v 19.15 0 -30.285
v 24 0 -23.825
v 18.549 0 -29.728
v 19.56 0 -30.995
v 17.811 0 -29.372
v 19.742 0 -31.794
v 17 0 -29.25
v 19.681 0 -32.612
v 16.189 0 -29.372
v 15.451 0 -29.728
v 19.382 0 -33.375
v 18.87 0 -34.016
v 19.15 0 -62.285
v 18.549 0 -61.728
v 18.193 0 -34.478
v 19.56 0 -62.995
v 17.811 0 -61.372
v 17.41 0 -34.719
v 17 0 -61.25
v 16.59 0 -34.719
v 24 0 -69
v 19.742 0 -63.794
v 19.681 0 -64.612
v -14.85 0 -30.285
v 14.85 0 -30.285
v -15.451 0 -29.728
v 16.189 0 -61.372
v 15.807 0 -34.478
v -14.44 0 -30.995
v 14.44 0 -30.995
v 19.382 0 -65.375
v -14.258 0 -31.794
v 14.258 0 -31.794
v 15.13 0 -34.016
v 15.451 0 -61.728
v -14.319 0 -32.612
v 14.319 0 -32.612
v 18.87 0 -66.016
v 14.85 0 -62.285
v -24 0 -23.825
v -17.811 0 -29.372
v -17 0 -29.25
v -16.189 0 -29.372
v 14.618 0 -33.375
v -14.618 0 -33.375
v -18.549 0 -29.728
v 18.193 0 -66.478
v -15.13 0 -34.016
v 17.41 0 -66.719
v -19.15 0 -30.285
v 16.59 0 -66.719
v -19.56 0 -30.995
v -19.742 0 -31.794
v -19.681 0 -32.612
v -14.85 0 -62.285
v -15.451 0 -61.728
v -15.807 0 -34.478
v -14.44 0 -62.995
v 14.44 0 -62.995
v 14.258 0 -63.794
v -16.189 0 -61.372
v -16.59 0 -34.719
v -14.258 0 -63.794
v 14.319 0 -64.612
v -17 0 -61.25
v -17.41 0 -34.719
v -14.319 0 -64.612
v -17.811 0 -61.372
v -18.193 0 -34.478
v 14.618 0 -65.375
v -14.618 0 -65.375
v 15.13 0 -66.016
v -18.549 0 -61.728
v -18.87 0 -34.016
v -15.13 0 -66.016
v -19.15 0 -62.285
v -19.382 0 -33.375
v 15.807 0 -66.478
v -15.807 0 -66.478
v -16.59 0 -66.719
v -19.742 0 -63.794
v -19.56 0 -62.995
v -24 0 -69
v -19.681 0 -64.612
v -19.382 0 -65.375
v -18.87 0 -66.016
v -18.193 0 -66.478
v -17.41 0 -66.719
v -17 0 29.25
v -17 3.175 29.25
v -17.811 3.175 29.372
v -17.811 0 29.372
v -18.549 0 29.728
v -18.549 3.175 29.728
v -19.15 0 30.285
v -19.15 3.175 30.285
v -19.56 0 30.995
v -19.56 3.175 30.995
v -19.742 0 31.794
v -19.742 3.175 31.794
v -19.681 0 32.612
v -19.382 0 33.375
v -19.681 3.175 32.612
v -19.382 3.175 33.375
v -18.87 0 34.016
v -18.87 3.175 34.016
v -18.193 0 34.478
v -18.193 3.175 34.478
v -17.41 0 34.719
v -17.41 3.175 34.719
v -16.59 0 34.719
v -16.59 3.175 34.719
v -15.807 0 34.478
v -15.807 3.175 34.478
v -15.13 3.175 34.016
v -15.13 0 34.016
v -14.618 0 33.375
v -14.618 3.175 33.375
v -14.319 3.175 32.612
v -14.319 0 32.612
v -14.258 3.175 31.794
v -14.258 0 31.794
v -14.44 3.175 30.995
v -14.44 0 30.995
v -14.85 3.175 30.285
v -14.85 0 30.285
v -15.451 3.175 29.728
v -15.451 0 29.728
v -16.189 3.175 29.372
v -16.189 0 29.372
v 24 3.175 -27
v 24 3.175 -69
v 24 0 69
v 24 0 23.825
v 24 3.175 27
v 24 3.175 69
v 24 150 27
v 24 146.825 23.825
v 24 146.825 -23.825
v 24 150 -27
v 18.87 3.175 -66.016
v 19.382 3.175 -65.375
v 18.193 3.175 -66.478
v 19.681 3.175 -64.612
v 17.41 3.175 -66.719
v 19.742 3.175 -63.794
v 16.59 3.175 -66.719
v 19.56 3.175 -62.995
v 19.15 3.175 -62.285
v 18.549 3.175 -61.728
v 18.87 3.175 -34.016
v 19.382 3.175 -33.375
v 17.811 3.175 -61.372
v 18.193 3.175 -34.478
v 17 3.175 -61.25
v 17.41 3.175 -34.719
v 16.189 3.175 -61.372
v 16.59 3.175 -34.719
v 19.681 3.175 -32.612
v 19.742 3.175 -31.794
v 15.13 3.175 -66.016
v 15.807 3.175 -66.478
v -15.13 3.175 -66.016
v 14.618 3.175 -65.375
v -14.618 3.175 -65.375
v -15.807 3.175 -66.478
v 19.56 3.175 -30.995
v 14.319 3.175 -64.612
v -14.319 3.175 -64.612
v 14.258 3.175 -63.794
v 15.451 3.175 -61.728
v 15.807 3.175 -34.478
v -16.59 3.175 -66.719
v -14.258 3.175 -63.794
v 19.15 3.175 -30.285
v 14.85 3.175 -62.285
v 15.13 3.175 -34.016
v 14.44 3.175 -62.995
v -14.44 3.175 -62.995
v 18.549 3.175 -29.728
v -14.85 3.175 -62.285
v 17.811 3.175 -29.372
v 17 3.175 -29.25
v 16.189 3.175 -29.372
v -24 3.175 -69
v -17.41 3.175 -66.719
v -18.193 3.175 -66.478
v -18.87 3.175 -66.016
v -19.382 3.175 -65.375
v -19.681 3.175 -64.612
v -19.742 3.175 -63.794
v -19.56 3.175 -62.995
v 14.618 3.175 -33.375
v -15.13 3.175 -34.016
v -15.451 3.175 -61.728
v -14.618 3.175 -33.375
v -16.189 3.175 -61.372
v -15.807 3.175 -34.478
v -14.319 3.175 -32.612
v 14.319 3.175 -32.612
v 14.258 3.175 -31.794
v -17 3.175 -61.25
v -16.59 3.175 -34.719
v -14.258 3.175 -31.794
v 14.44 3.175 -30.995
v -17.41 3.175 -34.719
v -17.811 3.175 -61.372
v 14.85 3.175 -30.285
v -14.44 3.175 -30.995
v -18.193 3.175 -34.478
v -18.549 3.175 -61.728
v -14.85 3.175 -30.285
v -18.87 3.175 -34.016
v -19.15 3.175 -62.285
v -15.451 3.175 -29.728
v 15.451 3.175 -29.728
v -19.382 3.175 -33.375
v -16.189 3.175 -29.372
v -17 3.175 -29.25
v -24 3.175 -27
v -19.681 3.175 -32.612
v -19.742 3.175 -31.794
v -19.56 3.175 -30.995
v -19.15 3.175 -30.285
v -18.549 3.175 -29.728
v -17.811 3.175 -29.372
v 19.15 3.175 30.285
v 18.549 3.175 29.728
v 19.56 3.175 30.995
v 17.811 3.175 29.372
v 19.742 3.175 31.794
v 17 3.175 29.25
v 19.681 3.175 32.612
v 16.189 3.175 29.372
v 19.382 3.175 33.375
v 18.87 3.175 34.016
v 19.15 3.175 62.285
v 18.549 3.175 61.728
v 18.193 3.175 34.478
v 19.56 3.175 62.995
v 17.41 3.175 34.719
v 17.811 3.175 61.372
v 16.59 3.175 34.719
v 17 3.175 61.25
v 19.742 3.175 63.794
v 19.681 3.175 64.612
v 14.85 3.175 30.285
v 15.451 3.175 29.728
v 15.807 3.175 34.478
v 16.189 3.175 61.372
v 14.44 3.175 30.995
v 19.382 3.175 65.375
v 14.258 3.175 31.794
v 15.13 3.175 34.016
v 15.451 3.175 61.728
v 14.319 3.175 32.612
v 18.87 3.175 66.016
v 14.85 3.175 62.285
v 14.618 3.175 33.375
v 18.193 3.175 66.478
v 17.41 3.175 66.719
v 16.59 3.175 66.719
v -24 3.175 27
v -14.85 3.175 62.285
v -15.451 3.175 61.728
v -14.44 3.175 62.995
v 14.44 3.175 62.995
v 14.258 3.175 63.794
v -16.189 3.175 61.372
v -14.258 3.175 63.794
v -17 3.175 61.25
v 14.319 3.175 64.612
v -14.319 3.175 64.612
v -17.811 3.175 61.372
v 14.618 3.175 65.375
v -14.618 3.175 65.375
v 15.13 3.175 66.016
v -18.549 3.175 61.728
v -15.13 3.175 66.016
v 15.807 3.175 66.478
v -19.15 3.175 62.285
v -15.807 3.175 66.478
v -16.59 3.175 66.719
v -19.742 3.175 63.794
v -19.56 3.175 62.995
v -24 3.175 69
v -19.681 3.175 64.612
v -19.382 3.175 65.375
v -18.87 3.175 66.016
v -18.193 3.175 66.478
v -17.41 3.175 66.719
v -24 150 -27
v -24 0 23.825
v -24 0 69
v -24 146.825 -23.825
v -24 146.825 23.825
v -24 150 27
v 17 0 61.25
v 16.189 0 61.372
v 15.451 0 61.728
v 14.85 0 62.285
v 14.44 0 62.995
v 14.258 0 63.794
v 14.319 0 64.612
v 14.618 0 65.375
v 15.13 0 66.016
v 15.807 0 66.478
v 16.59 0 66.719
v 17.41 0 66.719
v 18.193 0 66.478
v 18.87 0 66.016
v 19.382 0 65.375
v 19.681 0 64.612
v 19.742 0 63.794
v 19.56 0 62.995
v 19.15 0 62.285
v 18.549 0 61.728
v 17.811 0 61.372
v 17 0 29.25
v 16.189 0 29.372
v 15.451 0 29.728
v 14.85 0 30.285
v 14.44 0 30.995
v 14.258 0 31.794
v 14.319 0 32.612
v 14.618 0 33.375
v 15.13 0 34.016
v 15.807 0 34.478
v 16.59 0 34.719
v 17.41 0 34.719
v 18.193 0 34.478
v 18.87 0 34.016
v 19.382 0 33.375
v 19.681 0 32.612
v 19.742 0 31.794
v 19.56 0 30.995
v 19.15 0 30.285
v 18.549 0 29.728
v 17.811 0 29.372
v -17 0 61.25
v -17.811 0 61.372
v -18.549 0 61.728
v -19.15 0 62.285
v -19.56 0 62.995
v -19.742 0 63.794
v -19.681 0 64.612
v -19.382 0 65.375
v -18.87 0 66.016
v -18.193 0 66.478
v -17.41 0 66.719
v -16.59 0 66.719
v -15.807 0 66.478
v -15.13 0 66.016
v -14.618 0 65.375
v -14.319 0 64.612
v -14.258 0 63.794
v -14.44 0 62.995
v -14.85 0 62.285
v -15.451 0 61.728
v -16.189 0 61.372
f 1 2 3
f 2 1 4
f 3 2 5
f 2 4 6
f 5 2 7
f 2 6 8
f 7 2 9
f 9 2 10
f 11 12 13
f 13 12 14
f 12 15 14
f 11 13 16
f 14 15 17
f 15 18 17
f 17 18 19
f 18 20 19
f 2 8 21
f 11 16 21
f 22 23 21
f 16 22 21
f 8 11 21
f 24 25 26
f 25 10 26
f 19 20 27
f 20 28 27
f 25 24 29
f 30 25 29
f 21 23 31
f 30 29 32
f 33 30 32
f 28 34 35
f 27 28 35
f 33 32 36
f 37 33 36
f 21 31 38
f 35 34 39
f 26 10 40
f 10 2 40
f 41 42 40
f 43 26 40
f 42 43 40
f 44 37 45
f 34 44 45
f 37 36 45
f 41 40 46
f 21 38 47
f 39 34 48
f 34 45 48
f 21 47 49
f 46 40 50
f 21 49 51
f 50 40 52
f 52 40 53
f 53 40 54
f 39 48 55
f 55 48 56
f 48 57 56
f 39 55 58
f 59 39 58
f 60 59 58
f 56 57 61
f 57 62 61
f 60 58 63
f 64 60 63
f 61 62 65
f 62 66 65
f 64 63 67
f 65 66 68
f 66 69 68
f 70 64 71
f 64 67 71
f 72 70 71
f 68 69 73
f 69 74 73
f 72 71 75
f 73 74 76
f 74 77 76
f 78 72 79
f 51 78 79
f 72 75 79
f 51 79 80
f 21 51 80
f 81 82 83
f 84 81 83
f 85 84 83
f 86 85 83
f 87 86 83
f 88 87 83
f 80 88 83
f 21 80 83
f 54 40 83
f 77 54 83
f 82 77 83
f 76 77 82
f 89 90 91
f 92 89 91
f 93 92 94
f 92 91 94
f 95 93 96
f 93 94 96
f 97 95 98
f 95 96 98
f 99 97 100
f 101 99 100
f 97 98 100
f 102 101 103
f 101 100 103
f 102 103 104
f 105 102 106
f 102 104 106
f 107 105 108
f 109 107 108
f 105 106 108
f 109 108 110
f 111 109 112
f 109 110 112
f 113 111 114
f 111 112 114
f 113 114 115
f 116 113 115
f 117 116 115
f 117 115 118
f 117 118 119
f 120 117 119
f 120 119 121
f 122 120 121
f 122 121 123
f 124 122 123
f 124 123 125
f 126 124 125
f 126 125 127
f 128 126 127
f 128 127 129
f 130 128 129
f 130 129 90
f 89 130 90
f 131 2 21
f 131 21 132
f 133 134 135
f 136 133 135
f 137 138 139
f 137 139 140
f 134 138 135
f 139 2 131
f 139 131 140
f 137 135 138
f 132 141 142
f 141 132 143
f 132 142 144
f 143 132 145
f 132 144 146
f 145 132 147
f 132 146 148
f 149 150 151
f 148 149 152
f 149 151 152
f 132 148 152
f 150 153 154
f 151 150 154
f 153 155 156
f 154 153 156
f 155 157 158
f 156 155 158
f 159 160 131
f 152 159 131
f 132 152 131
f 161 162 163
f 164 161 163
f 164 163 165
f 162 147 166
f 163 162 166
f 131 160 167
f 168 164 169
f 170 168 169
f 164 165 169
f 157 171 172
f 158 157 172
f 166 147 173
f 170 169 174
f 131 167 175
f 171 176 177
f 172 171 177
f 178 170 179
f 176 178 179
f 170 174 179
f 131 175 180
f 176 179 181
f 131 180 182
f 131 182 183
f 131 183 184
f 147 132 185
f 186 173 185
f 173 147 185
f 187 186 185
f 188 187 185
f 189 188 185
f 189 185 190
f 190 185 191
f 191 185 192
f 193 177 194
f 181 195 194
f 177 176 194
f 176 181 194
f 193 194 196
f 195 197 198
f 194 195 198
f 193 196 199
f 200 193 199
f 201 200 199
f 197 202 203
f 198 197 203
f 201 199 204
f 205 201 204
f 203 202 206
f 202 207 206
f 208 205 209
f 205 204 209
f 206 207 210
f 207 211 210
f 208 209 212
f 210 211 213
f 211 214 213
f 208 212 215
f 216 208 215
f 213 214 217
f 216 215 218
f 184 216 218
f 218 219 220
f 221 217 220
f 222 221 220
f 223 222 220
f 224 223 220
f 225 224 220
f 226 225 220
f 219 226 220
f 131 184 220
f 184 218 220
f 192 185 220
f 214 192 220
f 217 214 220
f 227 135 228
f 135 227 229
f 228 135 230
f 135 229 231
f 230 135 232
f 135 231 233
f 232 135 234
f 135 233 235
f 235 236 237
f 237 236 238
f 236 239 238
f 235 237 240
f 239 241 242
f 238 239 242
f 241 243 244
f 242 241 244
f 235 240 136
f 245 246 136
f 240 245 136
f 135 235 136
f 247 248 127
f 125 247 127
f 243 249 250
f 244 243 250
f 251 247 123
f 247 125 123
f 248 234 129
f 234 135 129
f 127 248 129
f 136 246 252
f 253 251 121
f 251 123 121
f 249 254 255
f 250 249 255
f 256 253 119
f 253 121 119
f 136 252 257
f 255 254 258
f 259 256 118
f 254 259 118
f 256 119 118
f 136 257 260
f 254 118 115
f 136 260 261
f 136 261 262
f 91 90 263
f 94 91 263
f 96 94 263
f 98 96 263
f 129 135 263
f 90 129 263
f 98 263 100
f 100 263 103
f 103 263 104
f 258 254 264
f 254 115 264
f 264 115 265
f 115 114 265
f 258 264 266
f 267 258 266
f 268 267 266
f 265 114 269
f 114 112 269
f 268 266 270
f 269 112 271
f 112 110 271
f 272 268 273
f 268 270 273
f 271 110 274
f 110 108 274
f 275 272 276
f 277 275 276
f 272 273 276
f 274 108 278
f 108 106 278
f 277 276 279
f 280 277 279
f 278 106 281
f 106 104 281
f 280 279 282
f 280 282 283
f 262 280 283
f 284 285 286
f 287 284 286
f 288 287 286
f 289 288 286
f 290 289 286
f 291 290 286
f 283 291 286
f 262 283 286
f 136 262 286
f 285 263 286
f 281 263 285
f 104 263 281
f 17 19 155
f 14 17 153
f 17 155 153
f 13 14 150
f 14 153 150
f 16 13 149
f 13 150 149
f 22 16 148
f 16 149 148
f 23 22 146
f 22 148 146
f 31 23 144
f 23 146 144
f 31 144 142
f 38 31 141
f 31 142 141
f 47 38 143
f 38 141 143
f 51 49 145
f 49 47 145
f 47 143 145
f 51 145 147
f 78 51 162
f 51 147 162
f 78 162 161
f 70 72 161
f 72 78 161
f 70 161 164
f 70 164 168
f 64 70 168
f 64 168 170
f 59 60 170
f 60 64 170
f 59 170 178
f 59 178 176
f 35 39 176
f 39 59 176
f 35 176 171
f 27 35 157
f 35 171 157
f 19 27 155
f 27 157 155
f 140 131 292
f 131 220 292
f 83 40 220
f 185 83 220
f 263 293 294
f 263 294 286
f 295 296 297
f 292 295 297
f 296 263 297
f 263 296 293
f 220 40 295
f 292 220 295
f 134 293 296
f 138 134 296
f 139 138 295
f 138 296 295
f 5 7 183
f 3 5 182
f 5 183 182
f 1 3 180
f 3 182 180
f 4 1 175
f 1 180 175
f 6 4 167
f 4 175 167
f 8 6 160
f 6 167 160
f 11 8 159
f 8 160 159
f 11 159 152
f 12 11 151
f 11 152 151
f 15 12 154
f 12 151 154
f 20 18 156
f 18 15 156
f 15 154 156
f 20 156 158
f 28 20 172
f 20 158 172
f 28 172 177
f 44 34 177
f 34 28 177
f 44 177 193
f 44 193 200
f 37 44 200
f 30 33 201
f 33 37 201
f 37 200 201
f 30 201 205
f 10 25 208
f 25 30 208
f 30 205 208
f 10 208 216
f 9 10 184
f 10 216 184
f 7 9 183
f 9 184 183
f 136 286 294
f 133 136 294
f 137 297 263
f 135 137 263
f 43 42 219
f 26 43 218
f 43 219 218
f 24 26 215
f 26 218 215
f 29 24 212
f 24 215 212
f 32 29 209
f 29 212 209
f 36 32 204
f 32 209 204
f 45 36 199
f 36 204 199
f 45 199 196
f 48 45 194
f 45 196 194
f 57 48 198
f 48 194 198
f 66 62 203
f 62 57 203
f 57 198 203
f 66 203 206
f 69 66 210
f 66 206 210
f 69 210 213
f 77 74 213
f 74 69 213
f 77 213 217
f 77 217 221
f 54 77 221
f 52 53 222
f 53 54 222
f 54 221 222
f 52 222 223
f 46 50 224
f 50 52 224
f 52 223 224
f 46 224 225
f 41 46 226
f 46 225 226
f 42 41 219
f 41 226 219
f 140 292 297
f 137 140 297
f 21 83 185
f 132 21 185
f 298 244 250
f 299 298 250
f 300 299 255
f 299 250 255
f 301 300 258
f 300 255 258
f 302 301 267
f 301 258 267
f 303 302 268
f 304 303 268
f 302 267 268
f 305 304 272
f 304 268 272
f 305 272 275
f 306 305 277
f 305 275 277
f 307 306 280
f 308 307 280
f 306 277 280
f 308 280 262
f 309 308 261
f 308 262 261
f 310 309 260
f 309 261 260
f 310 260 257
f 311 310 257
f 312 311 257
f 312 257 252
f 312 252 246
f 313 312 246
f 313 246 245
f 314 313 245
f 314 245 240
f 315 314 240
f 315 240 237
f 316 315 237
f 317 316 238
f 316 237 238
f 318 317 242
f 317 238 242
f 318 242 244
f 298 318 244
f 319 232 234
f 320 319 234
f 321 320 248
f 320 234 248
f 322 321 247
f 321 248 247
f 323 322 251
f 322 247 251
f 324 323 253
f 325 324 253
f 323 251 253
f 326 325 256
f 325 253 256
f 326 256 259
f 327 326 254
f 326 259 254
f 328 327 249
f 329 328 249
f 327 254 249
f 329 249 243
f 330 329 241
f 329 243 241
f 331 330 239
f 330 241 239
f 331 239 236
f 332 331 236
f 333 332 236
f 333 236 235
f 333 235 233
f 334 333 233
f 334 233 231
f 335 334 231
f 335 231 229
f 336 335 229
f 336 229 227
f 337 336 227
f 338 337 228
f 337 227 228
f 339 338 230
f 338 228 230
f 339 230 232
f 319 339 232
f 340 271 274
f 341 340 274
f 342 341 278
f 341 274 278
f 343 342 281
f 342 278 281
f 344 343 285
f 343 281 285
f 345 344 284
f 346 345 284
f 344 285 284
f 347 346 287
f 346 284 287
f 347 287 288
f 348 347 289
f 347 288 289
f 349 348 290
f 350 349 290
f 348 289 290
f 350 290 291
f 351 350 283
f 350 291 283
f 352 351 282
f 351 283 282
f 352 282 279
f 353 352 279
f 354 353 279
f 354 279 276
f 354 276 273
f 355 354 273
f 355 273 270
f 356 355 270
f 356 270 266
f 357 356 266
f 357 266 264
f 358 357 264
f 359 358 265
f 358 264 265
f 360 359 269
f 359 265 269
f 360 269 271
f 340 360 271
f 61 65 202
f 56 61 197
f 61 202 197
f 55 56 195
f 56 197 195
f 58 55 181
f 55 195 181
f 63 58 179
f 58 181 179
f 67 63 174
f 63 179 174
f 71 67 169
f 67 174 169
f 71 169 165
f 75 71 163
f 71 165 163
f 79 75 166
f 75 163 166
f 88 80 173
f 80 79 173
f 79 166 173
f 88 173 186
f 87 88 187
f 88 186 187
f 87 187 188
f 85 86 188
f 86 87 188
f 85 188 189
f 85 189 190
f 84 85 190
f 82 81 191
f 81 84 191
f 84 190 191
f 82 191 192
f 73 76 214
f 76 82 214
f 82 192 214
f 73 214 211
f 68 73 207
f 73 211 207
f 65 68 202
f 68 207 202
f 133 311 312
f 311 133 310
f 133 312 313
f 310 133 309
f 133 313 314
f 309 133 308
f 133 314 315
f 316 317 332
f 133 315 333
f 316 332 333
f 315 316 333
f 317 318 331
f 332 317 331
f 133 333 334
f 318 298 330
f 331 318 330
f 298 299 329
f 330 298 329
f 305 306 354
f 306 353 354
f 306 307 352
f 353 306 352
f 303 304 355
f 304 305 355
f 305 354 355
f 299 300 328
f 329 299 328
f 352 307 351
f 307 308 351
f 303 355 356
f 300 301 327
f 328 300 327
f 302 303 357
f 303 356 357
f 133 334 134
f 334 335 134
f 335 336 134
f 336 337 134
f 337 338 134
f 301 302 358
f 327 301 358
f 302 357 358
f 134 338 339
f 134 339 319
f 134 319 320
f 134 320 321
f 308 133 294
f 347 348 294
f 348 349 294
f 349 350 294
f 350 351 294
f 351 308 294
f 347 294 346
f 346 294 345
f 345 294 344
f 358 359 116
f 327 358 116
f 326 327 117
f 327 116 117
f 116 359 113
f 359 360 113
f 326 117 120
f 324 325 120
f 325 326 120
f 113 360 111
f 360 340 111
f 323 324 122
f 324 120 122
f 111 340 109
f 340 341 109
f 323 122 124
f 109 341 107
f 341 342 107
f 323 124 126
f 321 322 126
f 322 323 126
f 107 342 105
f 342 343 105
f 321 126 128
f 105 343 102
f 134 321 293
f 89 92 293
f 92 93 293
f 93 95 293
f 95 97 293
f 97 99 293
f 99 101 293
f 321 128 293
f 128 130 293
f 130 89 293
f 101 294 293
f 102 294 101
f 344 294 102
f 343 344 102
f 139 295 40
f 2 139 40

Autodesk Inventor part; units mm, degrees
ref_plane "YZ Plane" through (0, 0, 0) normal (1, 0, 0) x (0, 1, 0)
ref_plane "XZ Plane" through (0, 0, 0) normal (0, 1, 0) x (-1, 0, 0)
ref_plane "XY Plane" through (0, 0, 0) normal (0, 0, 1) x (1, 0, 0)
sketch "Sketch1" plane through (0, 0, 0) normal (1, 0, 0) x (0, 1, 0)
  line L0 (0, 69) -> (0, 23.825)
  line L1 (0, 23.825) -> (146.825, 23.825)
  line L2 (146.825, 23.825) -> (146.825, -23.825)
  line L3 (146.825, -23.825) -> (0, -23.825)
  line L4 (0, -23.825) -> (0, -69)
  line L5 (0, -69) -> (3.175, -69)
  line L6 (3.175, -69) -> (3.175, -27)
  line L7 (3.175, -27) -> (150, -27)
  line L8 (150, -27) -> (150, 27)
  line L9 (150, 27) -> (3.175, 27)
  line L10 (3.175, 27) -> (3.175, 69)
  line L11 (3.175, 69) -> (0, 69)
  line L12 (6.6614, 27) -> (6.6614, 23.825) construction
  line L13 (146.825, 0) -> (150, 0) construction
  line L14 (6.6614, -23.825) -> (6.6614, -27) construction
  line L15 (-30, 0) -> (180, 0) construction
  line L16 (106.5396, 5.913) -> (72.5659, 5.913) construction
  line L17 (114.8237, 26.913) -> (65.8343, 26.913) construction
  point P0 (0, 0)
  dimension "d0" = 3.175
  dimension "d3" = 150
  dimension "d4" = 29.738
  dimension "d5" = 21
  dimension "d24" = 42
  dimension "d25" = 54
extrude "Extrusion1" add sketch "Sketch1" along normal mid plane 48
sketch "Sketch2" plane through (-24, 0, 23.825) normal (0, -1, 0) x (1, 0, 0)
  line L0 (0, 0) -> (0, 45.175) projected
  line L1 (0, 0) -> (48, 0) projected
  line L2 (48, 45.175) -> (48, 0) projected
  line L3 (48, 45.175) -> (0, 45.175) projected
  line L4 (0, -92.825) -> (0, -47.65) projected
  line L5 (0, -92.825) -> (48, -92.825) projected
  line L6 (48, -47.65) -> (48, -92.825) projected
  line L7 (0, -47.65) -> (48, -47.65) projected
  line L8 (0, 0) -> (48, 0) projected
  line L9 (0, 0) -> (0, 45.175) projected
  line L10 (24, 72.775) -> (24, -120.425) projected
  point P0 (24, -23.825)
  point P1 (41, 40.175)
  dimension "d9" = 5
  dimension "d10" = 17
hole "Hole1" at (17, 0, 64) direction (0, 1, 0) diameter 5.5 end through all
pattern_linear "Rectangular Pattern1" count 2 spacing 32 along (0, 0, -1) count 2 spacing 34 along (-1, 0, 0) of "Hole1"
mirror "Mirror1" about plane through (0, 0, 0) normal (0, 0, 1) of "Hole1", "Rectangular Pattern1"
equation "\"d25\" = Gap"
equation "\"Gap\" = 54"
properties part number "Sheet Metal Arm v2"
